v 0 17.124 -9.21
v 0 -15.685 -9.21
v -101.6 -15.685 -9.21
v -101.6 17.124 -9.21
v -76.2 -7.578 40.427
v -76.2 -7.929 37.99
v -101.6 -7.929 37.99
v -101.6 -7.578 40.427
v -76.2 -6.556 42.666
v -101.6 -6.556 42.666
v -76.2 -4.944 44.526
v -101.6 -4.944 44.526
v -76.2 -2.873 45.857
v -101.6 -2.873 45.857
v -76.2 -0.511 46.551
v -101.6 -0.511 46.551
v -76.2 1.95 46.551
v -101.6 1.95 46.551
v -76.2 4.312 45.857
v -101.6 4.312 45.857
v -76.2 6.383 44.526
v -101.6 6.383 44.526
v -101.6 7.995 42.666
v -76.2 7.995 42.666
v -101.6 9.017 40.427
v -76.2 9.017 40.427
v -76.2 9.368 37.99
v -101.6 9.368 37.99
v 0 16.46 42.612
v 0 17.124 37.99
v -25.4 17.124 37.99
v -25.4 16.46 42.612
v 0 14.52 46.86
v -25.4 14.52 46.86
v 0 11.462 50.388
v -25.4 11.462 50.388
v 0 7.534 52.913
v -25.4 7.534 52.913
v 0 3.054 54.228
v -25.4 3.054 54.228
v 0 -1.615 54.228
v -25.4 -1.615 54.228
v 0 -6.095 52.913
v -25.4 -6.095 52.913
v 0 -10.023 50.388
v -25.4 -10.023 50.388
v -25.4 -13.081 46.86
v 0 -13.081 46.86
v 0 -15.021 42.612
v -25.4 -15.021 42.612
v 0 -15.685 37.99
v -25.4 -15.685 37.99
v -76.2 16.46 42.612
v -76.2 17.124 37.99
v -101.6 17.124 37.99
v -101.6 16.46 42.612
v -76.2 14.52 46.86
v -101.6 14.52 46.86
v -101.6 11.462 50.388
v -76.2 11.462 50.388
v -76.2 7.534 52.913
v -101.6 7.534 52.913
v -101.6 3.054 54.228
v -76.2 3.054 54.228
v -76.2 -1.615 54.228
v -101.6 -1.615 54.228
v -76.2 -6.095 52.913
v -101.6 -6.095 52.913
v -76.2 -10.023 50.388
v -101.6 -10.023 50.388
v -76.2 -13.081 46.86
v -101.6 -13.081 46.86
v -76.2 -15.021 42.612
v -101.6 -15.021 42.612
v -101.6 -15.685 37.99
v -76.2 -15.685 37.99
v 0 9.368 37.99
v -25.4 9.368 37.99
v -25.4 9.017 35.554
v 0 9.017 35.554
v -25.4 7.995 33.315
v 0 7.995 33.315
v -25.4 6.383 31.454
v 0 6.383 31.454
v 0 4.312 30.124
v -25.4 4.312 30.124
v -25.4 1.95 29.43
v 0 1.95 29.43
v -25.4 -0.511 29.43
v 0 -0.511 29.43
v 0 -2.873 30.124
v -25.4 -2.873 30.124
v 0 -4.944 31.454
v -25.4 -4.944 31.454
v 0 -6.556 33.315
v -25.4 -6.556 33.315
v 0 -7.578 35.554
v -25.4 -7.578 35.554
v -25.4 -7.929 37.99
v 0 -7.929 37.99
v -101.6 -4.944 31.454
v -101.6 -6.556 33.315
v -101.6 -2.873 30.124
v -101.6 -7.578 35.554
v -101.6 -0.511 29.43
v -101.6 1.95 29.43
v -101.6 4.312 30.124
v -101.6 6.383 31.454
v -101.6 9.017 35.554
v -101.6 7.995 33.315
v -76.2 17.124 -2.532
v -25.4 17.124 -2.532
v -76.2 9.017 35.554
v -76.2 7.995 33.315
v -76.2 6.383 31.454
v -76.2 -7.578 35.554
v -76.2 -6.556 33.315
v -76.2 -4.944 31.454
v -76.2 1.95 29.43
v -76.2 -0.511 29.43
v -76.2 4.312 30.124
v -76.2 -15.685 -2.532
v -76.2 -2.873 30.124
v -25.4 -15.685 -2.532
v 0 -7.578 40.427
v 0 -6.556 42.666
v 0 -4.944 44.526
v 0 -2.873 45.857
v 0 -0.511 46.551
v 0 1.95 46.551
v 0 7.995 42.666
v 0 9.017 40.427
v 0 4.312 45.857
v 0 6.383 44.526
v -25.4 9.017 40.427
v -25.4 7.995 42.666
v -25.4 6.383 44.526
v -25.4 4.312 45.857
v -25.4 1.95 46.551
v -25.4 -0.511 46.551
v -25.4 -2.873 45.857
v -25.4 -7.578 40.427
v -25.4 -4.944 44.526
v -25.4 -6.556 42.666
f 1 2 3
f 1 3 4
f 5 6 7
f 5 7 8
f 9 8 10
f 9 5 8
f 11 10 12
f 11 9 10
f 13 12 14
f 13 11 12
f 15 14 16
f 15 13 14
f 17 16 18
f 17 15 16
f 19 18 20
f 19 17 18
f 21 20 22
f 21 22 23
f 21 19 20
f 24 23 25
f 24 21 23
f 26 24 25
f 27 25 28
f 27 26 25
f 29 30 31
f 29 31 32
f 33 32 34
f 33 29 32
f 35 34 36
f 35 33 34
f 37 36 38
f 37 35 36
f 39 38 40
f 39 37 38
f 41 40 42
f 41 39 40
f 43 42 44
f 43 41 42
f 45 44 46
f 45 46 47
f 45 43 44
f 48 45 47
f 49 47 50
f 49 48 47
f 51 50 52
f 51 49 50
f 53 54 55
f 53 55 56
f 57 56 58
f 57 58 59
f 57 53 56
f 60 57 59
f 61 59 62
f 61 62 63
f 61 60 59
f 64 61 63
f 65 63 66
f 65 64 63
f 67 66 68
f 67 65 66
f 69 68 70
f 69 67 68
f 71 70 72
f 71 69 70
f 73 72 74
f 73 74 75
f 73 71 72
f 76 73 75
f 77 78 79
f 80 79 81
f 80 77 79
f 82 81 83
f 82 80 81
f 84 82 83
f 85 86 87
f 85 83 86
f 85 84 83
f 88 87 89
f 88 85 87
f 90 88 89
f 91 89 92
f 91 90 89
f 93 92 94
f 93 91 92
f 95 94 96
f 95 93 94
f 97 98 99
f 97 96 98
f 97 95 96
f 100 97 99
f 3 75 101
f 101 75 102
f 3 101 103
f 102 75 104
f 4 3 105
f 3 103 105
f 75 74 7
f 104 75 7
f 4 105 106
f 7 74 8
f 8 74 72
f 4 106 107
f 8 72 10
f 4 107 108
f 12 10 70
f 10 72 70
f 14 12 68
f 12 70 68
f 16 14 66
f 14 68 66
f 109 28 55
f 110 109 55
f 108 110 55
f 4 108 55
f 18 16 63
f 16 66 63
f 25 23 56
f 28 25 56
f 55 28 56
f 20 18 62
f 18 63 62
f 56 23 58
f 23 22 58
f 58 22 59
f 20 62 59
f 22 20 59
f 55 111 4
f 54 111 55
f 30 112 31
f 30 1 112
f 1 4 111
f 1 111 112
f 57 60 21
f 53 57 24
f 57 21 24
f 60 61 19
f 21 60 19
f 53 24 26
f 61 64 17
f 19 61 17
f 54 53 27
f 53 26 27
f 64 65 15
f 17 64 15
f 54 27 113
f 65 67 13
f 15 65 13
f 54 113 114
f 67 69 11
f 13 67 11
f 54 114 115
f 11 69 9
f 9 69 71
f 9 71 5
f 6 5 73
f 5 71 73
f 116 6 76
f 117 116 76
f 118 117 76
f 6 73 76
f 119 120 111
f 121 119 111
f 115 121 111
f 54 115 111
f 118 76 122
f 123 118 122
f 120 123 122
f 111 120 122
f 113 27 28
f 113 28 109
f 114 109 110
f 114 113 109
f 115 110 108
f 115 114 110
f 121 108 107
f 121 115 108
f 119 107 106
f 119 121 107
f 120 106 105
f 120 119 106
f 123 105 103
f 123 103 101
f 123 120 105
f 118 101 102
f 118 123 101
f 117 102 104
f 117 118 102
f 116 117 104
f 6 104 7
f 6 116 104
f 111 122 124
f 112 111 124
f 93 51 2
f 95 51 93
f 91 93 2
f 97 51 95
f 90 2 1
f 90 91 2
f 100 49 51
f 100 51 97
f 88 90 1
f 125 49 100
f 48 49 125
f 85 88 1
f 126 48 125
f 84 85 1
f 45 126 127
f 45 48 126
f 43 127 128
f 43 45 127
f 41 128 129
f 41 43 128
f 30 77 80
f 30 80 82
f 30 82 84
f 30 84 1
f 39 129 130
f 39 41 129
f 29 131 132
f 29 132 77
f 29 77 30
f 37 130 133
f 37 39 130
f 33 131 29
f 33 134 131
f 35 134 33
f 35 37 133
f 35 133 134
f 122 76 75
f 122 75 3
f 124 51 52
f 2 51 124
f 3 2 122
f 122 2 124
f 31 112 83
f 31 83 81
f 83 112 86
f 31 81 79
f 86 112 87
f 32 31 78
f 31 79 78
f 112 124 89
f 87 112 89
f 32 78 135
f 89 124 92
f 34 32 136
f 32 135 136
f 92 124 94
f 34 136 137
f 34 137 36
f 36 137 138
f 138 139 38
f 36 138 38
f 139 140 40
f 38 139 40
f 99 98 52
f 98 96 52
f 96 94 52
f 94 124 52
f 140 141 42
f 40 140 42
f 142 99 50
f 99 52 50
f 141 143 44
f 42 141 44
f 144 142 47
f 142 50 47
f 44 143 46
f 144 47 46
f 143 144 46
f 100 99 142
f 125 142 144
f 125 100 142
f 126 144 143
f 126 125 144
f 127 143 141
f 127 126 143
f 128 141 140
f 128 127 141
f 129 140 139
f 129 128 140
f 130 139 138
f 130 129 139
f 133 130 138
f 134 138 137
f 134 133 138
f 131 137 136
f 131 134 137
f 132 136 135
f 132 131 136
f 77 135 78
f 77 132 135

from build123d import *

# Parameters (mm, degrees)
F1_DEPTH = 101.6
F3_DEPTH = 32.8108554164


with BuildPart() as f1:
    # F0 (on Right) → F1 (new body)
    with BuildSketch(Plane.YZ):
        with BuildLine():
            Line((-15.6854130328, 37.9903614521), (-15.6854130328, -9.2097846791))
            Line((-15.6854130328, -9.2097846791), (17.1244423836, -9.2097846791))
            Line((17.1244423836, -9.2097846791), (17.1244423836, 37.9903614521))
            ThreePointArc((17.1244423836, 37.9903614521), (0.7195146754, 21.5854337439), (-15.6854130328, 37.9903614521))
        make_face()
        with BuildLine():
            ThreePointArc((17.1244423836, 37.9903614521), (0.7195146754, 54.3952891603), (-15.6854130328, 37.9903614521))
            Line((-15.6854130328, 37.9903614521), (-7.9286920533, 37.9903614521))
            ThreePointArc((-7.9286920533, 37.9903614521), (0.7195146754, 46.6385681808), (9.3677214042, 37.9903614521))
            Line((9.3677214042, 37.9903614521), (17.1244423836, 37.9903614521))
        make_face()
        with BuildLine():
            Line((-7.9286920533, 37.9903614521), (-15.6854130328, 37.9903614521))
            ThreePointArc((-15.6854130328, 37.9903614521), (0.7195146754, 21.5854337439), (17.1244423836, 37.9903614521))
            Line((17.1244423836, 37.9903614521), (9.3677214042, 37.9903614521))
            ThreePointArc((9.3677214042, 37.9903614521), (0.7195146754, 29.3421547234), (-7.9286920533, 37.9903614521))
        make_face()
    extrude(amount=-F1_DEPTH)

    # F2 (on face) → F3 (cut, through all)
    with BuildSketch(Plane.XZ.offset(15.6854130328)):
        Polygon((-76.2, 37.9903614521), (-76.2, -2.5324999557), (-25.4, -2.5324999557), (-25.4, 37.9903614521), (-25.4, 66.8847560883), (-76.2, 66.8847560883), align=None)
    extrude(amount=-F3_DEPTH, mode=Mode.SUBTRACT)


solid = f1.part
